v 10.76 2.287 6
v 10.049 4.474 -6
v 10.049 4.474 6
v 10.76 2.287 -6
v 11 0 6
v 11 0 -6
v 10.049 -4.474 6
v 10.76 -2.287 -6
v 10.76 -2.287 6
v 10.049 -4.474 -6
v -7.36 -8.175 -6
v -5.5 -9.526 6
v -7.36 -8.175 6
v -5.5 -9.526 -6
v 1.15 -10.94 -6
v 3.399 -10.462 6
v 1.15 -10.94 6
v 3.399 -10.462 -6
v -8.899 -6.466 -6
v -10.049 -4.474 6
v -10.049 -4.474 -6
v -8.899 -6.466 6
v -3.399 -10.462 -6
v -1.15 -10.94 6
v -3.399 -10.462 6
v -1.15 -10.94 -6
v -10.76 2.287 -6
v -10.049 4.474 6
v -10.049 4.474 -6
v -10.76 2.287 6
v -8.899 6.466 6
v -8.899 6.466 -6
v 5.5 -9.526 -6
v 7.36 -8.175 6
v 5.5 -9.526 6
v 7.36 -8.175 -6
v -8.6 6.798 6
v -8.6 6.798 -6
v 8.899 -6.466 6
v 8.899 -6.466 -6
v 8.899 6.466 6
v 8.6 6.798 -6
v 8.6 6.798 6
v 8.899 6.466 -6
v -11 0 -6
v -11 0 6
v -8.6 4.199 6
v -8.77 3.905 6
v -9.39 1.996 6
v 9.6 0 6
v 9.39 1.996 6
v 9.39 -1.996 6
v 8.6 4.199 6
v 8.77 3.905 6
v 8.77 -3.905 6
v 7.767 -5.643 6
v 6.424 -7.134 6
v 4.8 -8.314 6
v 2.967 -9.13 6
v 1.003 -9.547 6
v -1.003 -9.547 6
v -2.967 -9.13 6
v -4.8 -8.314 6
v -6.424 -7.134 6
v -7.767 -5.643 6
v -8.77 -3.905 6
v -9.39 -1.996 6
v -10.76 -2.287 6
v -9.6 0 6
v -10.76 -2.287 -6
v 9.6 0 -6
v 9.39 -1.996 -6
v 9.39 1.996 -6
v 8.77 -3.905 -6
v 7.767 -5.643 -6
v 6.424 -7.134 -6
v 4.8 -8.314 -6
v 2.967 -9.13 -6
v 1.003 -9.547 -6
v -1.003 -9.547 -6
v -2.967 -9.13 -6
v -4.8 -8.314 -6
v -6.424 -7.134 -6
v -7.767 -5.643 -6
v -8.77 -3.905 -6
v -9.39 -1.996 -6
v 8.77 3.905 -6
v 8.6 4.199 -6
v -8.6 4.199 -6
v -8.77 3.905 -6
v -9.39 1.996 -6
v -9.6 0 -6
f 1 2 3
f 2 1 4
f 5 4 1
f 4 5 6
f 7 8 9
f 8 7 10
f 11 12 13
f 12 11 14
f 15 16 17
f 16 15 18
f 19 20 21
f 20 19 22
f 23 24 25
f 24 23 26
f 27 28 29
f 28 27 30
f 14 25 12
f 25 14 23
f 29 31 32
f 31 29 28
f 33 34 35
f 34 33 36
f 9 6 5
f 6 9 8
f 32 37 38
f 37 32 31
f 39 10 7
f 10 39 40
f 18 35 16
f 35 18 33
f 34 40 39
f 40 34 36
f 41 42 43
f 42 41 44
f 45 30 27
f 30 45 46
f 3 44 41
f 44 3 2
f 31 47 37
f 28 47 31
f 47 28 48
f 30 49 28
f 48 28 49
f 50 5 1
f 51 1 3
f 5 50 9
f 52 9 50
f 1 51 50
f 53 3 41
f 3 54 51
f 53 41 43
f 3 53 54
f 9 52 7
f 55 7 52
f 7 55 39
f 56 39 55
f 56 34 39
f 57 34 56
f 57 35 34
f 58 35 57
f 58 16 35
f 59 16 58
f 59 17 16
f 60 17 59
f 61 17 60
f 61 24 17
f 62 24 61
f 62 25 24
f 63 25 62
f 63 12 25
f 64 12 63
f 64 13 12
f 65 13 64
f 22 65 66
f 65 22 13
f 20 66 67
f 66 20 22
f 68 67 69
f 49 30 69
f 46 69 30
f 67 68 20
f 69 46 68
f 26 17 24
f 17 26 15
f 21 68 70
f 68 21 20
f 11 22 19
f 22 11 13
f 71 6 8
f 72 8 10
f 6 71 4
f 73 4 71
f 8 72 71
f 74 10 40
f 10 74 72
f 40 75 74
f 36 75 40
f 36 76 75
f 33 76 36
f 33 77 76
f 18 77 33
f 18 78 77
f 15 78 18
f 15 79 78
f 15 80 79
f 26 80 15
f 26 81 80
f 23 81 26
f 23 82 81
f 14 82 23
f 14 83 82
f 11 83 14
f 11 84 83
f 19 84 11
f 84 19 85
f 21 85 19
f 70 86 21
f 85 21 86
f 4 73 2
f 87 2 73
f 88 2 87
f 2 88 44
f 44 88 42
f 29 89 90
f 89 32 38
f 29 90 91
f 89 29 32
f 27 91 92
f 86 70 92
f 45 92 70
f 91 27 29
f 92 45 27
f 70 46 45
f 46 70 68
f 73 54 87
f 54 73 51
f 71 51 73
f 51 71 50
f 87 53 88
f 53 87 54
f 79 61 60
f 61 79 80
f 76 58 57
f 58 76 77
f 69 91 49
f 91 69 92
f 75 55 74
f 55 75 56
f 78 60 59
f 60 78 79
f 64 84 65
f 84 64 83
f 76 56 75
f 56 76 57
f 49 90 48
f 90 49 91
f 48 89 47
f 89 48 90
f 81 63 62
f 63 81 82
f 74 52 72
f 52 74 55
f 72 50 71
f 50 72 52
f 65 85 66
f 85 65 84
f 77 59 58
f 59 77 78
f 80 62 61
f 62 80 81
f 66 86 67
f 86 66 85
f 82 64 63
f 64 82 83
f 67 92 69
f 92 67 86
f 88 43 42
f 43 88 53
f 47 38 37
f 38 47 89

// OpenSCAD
id = 19.2;
od = 22;
width = 12;
difference()
{
    cylinder(width,od/2,od/2,center=true);
    cylinder(width+1,id/2,id/2,center=true);
    translate([0,width*3/4,0]) cube([id-2,id,width+1],center=true);
}
